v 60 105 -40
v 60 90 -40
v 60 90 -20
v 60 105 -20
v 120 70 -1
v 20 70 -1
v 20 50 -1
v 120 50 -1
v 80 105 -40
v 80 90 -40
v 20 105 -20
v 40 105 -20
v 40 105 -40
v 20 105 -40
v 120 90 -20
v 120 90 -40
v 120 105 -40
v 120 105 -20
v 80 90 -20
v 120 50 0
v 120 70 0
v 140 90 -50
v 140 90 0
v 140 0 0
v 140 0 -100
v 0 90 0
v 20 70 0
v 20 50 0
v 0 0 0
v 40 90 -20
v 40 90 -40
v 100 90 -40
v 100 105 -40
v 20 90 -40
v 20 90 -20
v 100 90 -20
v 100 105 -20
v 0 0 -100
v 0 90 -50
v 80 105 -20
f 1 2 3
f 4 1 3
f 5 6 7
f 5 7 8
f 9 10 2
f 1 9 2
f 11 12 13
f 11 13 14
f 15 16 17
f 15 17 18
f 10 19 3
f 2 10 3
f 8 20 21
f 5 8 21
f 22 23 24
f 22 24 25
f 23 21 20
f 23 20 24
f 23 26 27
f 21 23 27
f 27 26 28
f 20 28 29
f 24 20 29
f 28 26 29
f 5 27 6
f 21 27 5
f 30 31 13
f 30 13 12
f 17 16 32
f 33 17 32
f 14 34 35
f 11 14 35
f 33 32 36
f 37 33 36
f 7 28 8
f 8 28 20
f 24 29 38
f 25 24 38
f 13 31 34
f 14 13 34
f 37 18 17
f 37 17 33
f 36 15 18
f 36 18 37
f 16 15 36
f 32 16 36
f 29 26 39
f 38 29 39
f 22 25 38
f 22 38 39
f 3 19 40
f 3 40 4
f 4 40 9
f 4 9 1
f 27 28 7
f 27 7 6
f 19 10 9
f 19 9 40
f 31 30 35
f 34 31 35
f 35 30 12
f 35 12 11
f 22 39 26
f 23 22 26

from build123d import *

# Parameters (mm, degrees)
EXTRUDE1_DEPTH     = 140
SKETCH2_W          = 100
SKETCH2_H          = 20
CUT_EXTRUDE1_DEPTH = 1
SKETCH3_W          = 20
SKETCH3_H          = 20
EXTRUDE2_DEPTH     = 15
EXTRUDE2_2_DEPTH   = 15
EXTRUDE2_3_DEPTH   = 15


with BuildPart() as part:
    # Sketch1 → Extrude1 (new body)
    with BuildSketch(Plane(origin=(0, 0, 0), x_dir=(0, 0, -1), z_dir=(1, 0, 0))):
        Polygon((0, 90), (0, 0), (100, 0), (50, 90), align=None)
    extrude(amount=EXTRUDE1_DEPTH)

    # Sketch2 → Cut-Extrude1 (cut)
    with BuildSketch(Plane.XY):
        with Locations((70, 60)):
            Rectangle(SKETCH2_W, SKETCH2_H)
    extrude(amount=-CUT_EXTRUDE1_DEPTH, mode=Mode.SUBTRACT)


with BuildPart() as body_2:
    # Sketch3 → Extrude2 (new body)
    with BuildSketch(Plane(origin=(0, 90, 0), x_dir=(-1, 0, 0), z_dir=(0, 1, 0))):
        with Locations((-30, -30)):
            Rectangle(SKETCH3_W, SKETCH3_H)
    extrude(amount=EXTRUDE2_DEPTH)


with BuildPart() as body_3:
    # Sketch3 → Extrude2 2 (new body)
    with BuildSketch(Plane(origin=(0, 90, 0), x_dir=(-1, 0, 0), z_dir=(0, 1, 0))):
        with Locations((-70, -30)):
            Rectangle(SKETCH3_W, SKETCH3_H)
    extrude(amount=EXTRUDE2_2_DEPTH)


with BuildPart() as body_4:
    # Sketch3 → Extrude2 3 (new body)
    with BuildSketch(Plane(origin=(0, 90, 0), x_dir=(-1, 0, 0), z_dir=(0, 1, 0))):
        with Locations((-110, -30)):
            Rectangle(SKETCH3_W, SKETCH3_H)
    extrude(amount=EXTRUDE2_3_DEPTH)


solid = Compound([part.part, body_2.part, body_3.part, body_4.part])
